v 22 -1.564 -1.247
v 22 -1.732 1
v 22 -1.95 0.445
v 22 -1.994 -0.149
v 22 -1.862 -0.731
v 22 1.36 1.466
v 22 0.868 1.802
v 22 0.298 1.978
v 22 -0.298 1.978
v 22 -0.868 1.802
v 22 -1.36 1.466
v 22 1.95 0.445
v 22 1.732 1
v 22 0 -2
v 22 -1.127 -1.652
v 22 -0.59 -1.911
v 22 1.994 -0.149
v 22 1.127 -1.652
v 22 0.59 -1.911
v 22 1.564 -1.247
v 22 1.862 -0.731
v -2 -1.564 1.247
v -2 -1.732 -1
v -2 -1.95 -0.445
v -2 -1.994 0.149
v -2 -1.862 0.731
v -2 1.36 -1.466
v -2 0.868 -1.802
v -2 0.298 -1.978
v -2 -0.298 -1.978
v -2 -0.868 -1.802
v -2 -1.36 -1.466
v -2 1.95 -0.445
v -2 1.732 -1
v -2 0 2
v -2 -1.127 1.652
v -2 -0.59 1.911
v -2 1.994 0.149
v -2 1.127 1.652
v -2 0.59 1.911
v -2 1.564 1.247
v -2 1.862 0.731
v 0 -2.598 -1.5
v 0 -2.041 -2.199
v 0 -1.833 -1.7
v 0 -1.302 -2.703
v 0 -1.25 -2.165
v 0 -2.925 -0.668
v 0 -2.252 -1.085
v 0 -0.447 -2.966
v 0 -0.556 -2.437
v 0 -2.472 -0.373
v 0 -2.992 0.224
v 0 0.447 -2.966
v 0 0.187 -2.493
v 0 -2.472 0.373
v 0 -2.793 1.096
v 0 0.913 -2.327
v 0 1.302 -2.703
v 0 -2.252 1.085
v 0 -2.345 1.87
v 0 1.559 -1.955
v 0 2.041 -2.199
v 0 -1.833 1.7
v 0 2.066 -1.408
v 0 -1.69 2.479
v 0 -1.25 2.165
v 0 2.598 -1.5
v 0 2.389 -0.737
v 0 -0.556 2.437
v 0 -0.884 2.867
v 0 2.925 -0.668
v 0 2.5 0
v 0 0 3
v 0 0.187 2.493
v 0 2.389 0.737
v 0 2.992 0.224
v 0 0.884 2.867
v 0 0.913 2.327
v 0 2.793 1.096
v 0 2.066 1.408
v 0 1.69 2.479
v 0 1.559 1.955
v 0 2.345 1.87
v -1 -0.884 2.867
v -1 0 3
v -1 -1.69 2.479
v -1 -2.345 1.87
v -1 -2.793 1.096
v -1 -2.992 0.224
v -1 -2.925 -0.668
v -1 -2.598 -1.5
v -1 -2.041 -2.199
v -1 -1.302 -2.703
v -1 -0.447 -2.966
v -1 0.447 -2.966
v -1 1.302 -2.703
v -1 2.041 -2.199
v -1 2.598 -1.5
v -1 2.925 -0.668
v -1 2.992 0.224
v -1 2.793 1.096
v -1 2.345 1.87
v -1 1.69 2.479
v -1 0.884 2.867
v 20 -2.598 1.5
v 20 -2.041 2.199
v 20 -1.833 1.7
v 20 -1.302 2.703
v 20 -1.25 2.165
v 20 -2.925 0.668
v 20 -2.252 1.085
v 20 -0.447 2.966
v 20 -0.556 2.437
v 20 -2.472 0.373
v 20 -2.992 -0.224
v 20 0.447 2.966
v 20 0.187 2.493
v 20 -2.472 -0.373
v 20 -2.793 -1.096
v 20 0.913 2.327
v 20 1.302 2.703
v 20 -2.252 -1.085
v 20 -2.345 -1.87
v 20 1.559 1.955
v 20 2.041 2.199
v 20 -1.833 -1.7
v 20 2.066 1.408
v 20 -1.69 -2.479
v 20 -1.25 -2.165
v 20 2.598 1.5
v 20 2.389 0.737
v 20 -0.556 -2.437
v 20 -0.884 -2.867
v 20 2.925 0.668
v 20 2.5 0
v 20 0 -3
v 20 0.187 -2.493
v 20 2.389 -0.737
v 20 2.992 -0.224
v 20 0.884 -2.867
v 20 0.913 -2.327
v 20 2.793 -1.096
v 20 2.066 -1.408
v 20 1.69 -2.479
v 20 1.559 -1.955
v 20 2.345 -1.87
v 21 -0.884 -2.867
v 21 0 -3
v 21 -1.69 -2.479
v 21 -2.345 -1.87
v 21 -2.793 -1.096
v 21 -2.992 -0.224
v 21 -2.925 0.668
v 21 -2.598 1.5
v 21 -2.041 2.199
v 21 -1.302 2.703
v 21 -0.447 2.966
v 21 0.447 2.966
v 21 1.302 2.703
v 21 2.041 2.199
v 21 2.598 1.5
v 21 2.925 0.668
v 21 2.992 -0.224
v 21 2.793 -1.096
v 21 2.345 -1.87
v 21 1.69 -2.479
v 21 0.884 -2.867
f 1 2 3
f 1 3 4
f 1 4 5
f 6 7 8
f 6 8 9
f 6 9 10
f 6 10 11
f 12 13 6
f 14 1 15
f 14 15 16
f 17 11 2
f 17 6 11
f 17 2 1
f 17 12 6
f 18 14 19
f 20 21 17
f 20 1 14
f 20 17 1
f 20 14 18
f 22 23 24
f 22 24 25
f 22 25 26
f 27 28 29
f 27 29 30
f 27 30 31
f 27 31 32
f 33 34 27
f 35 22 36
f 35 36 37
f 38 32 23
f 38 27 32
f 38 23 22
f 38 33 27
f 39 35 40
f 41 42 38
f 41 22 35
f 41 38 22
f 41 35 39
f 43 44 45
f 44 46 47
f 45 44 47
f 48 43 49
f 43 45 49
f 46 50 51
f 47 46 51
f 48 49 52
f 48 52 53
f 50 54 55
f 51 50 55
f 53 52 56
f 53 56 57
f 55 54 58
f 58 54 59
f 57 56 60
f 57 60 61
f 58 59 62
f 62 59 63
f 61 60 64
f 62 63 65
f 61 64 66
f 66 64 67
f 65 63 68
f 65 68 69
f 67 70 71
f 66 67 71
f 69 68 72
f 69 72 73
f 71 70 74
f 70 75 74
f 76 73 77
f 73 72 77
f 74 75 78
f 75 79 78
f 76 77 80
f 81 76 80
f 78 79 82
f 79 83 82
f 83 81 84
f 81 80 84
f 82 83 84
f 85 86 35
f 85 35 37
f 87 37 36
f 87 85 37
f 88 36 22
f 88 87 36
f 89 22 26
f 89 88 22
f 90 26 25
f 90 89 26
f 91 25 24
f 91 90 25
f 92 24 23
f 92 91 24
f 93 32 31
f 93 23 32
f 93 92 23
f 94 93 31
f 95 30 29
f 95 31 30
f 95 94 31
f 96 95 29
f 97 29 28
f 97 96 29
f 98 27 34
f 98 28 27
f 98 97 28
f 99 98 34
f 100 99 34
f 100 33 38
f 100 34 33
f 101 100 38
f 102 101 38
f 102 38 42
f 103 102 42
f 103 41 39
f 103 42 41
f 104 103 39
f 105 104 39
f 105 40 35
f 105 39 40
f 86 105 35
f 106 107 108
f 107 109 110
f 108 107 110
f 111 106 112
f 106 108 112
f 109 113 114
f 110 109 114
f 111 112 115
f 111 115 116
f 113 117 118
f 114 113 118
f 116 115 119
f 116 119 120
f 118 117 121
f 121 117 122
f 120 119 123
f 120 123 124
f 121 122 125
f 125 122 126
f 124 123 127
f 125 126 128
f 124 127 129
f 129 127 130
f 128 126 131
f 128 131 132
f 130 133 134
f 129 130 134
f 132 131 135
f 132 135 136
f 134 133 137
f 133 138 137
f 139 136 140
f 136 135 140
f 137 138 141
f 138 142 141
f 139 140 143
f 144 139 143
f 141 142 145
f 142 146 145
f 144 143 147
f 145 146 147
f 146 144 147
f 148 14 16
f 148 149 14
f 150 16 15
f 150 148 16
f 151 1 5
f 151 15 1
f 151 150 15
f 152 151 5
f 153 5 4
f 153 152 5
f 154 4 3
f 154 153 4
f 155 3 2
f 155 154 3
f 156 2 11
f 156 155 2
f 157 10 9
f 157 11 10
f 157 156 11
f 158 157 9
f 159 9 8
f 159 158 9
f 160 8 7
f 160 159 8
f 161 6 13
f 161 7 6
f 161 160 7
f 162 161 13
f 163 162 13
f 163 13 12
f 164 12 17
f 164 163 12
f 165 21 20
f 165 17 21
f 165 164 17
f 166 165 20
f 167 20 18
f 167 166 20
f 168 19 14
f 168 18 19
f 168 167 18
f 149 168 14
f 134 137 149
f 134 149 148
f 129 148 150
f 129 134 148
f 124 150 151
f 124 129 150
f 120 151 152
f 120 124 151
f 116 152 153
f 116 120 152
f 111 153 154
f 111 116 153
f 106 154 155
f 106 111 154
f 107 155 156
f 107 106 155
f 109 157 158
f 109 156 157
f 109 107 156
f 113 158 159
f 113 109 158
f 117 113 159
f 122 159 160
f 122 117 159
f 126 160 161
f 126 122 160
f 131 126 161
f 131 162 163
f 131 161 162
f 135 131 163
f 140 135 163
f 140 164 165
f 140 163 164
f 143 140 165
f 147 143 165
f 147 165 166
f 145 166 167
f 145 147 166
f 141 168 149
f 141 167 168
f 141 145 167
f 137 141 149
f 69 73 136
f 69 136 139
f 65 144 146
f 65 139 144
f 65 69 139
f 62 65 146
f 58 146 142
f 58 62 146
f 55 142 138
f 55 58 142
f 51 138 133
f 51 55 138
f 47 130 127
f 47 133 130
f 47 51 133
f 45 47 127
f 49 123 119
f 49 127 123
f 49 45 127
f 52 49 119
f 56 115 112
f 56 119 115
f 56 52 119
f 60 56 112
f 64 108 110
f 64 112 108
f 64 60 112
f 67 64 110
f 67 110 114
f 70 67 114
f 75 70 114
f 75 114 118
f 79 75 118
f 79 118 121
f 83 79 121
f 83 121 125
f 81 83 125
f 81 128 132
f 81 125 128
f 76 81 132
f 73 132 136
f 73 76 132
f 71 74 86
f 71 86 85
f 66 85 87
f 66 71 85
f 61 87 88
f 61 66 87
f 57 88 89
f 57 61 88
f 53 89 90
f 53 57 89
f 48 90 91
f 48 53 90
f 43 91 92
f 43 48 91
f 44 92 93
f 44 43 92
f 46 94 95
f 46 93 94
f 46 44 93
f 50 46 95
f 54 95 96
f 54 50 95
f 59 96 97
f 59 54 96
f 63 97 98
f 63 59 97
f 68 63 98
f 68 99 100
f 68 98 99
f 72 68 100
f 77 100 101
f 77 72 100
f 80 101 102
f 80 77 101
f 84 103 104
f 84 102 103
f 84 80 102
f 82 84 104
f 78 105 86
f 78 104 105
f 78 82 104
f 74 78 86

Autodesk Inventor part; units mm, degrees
ref_plane "YZ Plane" through (0, 0, 0) normal (1, 0, 0) x (0, 1, 0)
ref_plane "XZ Plane" through (0, 0, 0) normal (0, 1, 0) x (-1, 0, 0)
ref_plane "XY Plane" through (0, 0, 0) normal (0, 0, 1) x (1, 0, 0)
sketch "Sketch1" plane through (0, 0, 0) normal (1, 0, 0) x (0, 1, 0)
  circle A0 centre (0, 0) radius 2.5
  dimension "d0" = 5
extrude "Extrusion1" add sketch "Sketch1" along normal blind 20
sketch "Sketch2" plane through (20, 0, 0) normal (1, 0, 0) x (0, 0, -1)
  circle A0 centre (0, 0) radius 3
  dimension "d3" = 6
extrude "Extrusion2" add sketch "Sketch2" along normal blind 2
chamfer "Chamfer1" distance 1 angle 45 1 edges at (22, 0, 3)
sketch "Sketch3" plane through (0, 0, 0) normal (-1, 0, 0) x (0, 0, 1)
  circle A0 centre (0, 0) radius 3
extrude "Extrusion3" add sketch "Sketch3" along normal blind 2
chamfer "Chamfer2" distance 1 angle 45 1 edges at (-2, 0, -3)
properties part number "Shaft"
